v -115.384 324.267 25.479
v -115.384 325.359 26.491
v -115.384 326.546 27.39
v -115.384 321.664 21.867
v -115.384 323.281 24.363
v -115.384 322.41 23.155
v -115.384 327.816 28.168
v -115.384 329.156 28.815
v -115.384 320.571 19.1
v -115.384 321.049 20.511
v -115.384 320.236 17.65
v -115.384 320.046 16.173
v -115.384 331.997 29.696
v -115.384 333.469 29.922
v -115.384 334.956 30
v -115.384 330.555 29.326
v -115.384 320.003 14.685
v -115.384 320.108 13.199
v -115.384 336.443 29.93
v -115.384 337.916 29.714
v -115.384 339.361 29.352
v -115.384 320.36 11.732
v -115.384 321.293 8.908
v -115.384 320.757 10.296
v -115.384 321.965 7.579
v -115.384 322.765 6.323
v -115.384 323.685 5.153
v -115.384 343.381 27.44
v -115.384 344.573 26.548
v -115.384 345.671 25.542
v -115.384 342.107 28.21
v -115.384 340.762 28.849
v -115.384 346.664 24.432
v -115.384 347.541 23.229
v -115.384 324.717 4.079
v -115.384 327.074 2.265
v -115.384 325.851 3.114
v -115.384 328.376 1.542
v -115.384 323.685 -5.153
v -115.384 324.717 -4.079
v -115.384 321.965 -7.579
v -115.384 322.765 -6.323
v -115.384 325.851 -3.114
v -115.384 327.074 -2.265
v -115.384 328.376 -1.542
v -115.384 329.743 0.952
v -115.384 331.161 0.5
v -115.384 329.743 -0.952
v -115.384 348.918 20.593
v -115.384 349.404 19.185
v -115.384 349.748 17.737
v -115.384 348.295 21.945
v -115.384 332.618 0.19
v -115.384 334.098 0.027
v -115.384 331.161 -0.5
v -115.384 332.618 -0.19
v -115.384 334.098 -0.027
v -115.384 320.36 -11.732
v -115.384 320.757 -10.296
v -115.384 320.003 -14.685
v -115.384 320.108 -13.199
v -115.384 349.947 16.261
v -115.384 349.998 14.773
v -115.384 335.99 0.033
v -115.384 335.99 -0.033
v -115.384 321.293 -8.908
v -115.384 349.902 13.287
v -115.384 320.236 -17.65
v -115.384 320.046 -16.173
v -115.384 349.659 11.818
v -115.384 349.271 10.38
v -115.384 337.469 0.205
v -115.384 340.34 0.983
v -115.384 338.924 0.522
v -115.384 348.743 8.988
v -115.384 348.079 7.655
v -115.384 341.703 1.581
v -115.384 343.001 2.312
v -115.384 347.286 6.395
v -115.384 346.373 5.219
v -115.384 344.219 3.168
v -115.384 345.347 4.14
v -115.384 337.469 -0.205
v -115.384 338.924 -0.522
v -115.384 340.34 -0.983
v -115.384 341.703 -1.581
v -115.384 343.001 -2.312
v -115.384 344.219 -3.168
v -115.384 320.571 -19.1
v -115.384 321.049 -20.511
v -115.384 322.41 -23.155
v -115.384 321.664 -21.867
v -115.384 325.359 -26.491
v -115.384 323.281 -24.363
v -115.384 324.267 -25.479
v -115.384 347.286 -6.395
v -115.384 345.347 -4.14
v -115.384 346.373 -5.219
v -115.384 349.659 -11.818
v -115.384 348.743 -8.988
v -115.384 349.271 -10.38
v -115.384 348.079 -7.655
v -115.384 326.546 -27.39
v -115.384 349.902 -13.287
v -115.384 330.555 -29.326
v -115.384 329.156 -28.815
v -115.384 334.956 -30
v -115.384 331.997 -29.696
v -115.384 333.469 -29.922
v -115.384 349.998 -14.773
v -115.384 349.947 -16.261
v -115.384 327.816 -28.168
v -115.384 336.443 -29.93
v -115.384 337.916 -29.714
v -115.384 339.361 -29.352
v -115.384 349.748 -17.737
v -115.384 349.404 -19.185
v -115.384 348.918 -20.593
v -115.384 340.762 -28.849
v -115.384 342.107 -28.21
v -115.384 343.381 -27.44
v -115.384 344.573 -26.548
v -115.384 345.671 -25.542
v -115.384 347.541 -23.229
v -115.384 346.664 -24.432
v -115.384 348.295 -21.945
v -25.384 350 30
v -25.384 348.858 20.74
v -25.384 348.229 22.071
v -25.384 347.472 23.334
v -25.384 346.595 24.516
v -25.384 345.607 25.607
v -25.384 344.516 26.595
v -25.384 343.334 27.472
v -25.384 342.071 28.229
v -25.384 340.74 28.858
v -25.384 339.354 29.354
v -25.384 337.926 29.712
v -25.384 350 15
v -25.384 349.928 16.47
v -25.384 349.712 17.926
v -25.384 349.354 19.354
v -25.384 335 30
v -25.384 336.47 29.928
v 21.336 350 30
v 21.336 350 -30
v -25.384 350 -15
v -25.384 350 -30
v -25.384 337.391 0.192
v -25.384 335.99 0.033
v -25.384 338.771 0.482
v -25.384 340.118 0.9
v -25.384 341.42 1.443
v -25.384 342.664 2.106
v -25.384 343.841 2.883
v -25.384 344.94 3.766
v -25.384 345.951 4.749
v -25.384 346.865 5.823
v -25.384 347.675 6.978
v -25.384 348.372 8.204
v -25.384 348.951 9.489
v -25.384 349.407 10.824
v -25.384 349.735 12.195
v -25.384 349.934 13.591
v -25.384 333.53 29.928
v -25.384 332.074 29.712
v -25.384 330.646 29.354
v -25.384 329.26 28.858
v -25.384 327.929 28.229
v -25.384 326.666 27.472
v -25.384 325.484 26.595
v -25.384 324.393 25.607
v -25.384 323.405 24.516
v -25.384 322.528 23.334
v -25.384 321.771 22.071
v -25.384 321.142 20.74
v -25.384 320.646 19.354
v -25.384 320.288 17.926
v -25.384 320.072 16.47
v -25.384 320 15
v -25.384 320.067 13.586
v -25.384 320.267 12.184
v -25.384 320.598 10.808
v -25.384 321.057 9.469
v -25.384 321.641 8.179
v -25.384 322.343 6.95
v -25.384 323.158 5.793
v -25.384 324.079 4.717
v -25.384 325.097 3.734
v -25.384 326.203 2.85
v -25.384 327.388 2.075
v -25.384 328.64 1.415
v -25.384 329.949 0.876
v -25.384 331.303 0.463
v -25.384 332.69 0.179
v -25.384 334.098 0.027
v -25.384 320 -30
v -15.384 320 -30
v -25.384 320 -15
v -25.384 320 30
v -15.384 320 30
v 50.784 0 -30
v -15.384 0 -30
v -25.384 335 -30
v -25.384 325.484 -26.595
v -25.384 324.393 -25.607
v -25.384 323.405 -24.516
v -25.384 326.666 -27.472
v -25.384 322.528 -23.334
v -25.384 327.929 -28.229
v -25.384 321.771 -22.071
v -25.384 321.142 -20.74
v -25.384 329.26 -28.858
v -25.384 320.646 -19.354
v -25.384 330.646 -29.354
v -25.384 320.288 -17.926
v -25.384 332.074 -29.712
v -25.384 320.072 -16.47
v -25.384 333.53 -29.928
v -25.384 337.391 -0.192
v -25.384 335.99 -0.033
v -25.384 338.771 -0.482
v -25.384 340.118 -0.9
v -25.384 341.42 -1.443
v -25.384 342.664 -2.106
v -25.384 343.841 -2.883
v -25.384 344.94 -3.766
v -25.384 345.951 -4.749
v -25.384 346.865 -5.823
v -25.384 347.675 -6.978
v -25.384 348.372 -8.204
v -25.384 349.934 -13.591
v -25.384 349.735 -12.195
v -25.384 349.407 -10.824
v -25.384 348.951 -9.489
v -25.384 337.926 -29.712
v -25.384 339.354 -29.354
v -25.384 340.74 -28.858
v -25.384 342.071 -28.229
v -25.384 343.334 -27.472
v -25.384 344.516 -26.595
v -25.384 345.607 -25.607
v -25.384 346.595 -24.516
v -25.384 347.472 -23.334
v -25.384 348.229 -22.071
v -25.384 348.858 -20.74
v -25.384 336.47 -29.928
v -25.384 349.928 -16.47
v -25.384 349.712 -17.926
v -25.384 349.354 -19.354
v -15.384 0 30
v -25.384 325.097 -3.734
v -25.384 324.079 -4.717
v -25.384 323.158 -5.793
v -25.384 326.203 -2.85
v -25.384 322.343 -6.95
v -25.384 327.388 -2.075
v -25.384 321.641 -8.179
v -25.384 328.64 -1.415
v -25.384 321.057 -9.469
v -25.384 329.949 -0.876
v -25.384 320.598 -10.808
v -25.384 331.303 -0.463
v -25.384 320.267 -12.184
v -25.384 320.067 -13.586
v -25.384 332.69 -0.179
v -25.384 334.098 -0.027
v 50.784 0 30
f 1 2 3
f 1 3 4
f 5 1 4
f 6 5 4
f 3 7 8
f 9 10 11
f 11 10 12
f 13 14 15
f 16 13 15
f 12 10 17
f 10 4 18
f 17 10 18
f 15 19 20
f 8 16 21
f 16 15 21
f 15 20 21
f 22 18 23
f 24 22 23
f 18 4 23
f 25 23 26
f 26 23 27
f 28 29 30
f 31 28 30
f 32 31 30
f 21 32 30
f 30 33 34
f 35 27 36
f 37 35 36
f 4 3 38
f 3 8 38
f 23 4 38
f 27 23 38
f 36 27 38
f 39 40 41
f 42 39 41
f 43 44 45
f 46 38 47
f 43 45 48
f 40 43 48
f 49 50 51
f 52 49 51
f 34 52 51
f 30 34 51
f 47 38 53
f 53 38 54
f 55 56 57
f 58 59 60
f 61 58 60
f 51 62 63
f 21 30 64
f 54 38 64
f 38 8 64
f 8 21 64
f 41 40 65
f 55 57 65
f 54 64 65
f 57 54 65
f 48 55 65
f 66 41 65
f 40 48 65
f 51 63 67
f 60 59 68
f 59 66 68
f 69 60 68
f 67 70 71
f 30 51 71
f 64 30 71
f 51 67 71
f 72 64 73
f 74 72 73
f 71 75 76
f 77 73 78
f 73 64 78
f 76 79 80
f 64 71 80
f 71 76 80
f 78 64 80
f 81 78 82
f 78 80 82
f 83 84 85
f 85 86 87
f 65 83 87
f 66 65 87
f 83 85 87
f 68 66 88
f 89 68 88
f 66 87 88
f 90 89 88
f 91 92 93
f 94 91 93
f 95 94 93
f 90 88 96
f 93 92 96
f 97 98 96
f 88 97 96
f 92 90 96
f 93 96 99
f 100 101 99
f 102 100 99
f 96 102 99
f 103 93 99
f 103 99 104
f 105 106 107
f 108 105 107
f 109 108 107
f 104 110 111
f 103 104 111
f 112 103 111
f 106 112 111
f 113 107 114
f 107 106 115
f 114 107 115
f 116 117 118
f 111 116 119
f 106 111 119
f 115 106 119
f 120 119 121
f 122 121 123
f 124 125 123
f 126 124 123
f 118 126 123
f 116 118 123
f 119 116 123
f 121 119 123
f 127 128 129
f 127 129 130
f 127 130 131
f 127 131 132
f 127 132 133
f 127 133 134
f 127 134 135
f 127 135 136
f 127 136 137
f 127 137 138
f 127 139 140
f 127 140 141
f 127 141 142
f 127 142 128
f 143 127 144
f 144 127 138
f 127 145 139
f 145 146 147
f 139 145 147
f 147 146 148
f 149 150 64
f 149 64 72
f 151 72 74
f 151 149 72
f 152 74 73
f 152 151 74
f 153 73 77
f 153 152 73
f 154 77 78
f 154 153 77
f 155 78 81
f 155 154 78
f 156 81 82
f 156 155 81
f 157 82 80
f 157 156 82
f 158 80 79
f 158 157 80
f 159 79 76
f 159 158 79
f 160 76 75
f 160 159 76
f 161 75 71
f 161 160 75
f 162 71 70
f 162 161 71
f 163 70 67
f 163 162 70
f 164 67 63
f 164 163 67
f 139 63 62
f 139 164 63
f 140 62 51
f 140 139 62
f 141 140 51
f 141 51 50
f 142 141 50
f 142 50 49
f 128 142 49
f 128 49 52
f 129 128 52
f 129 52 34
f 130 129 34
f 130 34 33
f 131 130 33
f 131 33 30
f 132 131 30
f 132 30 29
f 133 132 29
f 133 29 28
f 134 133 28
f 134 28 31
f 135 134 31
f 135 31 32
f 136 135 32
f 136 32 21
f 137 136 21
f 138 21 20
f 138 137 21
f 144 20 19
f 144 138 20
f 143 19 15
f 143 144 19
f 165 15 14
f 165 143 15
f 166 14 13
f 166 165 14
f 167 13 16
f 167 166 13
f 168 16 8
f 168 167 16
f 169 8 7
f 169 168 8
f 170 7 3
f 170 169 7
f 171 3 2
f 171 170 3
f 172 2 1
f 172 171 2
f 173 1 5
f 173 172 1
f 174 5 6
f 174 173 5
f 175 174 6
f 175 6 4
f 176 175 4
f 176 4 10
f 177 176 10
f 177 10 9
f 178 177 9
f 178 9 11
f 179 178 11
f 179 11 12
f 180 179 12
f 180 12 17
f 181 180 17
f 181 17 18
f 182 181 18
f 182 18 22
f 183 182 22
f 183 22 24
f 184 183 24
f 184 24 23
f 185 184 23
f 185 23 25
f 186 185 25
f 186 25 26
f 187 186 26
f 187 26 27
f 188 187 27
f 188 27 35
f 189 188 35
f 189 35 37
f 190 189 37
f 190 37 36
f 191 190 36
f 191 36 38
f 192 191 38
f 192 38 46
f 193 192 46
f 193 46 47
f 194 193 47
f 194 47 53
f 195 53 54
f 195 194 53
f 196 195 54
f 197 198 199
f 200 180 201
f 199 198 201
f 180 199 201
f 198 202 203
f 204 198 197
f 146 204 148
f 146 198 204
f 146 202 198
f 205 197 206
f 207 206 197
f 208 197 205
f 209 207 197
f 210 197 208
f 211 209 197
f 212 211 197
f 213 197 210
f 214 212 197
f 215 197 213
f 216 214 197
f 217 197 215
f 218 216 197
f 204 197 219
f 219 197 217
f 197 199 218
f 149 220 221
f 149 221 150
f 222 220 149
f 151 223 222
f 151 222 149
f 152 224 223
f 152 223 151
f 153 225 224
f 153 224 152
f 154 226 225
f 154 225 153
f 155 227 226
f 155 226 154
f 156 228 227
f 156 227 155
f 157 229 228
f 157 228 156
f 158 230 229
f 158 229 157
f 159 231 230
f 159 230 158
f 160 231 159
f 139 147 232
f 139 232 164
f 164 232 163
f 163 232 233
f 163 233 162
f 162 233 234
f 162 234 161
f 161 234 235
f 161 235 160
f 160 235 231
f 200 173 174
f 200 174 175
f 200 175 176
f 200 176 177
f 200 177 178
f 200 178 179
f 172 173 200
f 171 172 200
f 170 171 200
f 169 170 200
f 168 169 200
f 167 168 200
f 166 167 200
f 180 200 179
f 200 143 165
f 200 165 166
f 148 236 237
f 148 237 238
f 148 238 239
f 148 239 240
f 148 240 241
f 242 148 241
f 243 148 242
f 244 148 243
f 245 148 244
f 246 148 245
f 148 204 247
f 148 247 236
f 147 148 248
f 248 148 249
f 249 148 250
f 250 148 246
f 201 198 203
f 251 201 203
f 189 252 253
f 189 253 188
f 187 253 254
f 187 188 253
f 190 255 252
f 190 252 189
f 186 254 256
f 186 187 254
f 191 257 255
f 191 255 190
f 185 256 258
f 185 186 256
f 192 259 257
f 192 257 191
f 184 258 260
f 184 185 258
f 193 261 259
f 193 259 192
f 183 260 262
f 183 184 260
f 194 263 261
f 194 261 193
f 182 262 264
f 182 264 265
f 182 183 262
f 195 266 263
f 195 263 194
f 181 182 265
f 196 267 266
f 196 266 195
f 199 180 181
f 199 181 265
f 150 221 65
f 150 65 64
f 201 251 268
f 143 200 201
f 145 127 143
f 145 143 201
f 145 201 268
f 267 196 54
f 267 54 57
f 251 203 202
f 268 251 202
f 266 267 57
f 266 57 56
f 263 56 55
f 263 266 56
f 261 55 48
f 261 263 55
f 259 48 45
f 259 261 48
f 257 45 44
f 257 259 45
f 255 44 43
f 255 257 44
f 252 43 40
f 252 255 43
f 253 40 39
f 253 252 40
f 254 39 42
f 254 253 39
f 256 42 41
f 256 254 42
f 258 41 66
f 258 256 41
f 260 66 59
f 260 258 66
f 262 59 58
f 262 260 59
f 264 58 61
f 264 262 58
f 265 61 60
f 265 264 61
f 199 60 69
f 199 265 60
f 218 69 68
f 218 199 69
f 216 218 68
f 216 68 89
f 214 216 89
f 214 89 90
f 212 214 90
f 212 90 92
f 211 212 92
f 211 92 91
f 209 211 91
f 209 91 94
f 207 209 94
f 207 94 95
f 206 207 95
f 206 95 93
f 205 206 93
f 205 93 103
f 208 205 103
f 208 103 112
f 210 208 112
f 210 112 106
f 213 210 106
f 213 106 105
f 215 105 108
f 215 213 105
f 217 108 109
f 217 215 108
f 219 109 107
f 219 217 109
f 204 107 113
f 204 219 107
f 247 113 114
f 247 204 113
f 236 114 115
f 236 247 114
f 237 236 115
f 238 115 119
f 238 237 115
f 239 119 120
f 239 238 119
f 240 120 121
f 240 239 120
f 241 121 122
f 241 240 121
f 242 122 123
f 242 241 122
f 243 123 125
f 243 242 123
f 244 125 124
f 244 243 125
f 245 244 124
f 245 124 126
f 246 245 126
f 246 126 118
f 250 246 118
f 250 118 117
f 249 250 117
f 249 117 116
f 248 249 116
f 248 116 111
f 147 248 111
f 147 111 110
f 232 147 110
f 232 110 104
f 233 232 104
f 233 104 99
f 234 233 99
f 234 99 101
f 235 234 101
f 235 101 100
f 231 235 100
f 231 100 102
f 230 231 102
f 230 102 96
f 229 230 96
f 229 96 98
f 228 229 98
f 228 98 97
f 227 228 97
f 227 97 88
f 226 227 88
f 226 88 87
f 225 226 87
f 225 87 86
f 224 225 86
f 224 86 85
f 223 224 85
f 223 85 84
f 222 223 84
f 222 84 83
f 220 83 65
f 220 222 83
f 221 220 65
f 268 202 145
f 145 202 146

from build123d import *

# Parameters (mm, degrees)
ESTRUSIONE_ESTRUSIONE1_DEPTH      = 30
ESTRUSIONE_ESTRUSIONE1_DEPTH_BACK = 30
ESTRUSIONE_ESTRUSIONE2_DEPTH      = 100
SCHIZZO4_W                        = 60
SCHIZZO4_H                        = 30
ESTRUSIONE_ESTRUSIONE3_DEPTH      = 10


with BuildPart() as part:
    # Schizzo2 → Estrusione-Estrusione1 (new, two sides: drawn at the far end of the back side and taken through both)
    with BuildSketch(Plane.XY.offset(-ESTRUSIONE_ESTRUSIONE1_DEPTH_BACK)):
        Polygon((-15.384222889, 0), (50.78379402, 0), (21.335941259, 350), (-15.384222889, 350), align=None)
    extrude(amount=ESTRUSIONE_ESTRUSIONE1_DEPTH + ESTRUSIONE_ESTRUSIONE1_DEPTH_BACK)

    # Schizzo3 → Estrusione-Estrusione2 (add)
    with BuildSketch(Plane.ZY.offset(15.384222889)):
        with BuildLine():
            Line((-0.032724291, 335.990281697), (0.032724291, 335.990281697))
            ThreePointArc((0.032724291, 335.990281697), (29.999935115, 334.955880248), (0.027157826, 334.097782056))
            Line((0.027157826, 334.097782056), (-0.027157826, 334.097782056))
            ThreePointArc((-0.027157826, 334.097782056), (-29.999935115, 334.955880248), (-0.032724291, 335.990281697))
        make_face()
    extrude(amount=ESTRUSIONE_ESTRUSIONE2_DEPTH)

    # Schizzo4 → Estrusione-Estrusione3 (add)
    with BuildSketch(Plane.ZY.offset(15.384222889)):
        with Locations((0, 335)):
            Rectangle(SCHIZZO4_W, SCHIZZO4_H)
    extrude(amount=ESTRUSIONE_ESTRUSIONE3_DEPTH)


solid = part.part
